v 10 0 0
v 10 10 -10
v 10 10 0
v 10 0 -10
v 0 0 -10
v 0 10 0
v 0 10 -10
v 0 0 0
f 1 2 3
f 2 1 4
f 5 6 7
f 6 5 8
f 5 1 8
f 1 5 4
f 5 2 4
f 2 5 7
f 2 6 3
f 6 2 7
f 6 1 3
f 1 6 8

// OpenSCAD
// Failure class 3: rotation about the wrong axis
// The intent is to rotate 90 degrees about the Z-axis (spinning the shape
// in the XY plane), but the code rotates about the Y-axis instead, tilting
// the shape into the XZ plane.
rotate([0, 90, 0])
cube([10, 10, 10]);
